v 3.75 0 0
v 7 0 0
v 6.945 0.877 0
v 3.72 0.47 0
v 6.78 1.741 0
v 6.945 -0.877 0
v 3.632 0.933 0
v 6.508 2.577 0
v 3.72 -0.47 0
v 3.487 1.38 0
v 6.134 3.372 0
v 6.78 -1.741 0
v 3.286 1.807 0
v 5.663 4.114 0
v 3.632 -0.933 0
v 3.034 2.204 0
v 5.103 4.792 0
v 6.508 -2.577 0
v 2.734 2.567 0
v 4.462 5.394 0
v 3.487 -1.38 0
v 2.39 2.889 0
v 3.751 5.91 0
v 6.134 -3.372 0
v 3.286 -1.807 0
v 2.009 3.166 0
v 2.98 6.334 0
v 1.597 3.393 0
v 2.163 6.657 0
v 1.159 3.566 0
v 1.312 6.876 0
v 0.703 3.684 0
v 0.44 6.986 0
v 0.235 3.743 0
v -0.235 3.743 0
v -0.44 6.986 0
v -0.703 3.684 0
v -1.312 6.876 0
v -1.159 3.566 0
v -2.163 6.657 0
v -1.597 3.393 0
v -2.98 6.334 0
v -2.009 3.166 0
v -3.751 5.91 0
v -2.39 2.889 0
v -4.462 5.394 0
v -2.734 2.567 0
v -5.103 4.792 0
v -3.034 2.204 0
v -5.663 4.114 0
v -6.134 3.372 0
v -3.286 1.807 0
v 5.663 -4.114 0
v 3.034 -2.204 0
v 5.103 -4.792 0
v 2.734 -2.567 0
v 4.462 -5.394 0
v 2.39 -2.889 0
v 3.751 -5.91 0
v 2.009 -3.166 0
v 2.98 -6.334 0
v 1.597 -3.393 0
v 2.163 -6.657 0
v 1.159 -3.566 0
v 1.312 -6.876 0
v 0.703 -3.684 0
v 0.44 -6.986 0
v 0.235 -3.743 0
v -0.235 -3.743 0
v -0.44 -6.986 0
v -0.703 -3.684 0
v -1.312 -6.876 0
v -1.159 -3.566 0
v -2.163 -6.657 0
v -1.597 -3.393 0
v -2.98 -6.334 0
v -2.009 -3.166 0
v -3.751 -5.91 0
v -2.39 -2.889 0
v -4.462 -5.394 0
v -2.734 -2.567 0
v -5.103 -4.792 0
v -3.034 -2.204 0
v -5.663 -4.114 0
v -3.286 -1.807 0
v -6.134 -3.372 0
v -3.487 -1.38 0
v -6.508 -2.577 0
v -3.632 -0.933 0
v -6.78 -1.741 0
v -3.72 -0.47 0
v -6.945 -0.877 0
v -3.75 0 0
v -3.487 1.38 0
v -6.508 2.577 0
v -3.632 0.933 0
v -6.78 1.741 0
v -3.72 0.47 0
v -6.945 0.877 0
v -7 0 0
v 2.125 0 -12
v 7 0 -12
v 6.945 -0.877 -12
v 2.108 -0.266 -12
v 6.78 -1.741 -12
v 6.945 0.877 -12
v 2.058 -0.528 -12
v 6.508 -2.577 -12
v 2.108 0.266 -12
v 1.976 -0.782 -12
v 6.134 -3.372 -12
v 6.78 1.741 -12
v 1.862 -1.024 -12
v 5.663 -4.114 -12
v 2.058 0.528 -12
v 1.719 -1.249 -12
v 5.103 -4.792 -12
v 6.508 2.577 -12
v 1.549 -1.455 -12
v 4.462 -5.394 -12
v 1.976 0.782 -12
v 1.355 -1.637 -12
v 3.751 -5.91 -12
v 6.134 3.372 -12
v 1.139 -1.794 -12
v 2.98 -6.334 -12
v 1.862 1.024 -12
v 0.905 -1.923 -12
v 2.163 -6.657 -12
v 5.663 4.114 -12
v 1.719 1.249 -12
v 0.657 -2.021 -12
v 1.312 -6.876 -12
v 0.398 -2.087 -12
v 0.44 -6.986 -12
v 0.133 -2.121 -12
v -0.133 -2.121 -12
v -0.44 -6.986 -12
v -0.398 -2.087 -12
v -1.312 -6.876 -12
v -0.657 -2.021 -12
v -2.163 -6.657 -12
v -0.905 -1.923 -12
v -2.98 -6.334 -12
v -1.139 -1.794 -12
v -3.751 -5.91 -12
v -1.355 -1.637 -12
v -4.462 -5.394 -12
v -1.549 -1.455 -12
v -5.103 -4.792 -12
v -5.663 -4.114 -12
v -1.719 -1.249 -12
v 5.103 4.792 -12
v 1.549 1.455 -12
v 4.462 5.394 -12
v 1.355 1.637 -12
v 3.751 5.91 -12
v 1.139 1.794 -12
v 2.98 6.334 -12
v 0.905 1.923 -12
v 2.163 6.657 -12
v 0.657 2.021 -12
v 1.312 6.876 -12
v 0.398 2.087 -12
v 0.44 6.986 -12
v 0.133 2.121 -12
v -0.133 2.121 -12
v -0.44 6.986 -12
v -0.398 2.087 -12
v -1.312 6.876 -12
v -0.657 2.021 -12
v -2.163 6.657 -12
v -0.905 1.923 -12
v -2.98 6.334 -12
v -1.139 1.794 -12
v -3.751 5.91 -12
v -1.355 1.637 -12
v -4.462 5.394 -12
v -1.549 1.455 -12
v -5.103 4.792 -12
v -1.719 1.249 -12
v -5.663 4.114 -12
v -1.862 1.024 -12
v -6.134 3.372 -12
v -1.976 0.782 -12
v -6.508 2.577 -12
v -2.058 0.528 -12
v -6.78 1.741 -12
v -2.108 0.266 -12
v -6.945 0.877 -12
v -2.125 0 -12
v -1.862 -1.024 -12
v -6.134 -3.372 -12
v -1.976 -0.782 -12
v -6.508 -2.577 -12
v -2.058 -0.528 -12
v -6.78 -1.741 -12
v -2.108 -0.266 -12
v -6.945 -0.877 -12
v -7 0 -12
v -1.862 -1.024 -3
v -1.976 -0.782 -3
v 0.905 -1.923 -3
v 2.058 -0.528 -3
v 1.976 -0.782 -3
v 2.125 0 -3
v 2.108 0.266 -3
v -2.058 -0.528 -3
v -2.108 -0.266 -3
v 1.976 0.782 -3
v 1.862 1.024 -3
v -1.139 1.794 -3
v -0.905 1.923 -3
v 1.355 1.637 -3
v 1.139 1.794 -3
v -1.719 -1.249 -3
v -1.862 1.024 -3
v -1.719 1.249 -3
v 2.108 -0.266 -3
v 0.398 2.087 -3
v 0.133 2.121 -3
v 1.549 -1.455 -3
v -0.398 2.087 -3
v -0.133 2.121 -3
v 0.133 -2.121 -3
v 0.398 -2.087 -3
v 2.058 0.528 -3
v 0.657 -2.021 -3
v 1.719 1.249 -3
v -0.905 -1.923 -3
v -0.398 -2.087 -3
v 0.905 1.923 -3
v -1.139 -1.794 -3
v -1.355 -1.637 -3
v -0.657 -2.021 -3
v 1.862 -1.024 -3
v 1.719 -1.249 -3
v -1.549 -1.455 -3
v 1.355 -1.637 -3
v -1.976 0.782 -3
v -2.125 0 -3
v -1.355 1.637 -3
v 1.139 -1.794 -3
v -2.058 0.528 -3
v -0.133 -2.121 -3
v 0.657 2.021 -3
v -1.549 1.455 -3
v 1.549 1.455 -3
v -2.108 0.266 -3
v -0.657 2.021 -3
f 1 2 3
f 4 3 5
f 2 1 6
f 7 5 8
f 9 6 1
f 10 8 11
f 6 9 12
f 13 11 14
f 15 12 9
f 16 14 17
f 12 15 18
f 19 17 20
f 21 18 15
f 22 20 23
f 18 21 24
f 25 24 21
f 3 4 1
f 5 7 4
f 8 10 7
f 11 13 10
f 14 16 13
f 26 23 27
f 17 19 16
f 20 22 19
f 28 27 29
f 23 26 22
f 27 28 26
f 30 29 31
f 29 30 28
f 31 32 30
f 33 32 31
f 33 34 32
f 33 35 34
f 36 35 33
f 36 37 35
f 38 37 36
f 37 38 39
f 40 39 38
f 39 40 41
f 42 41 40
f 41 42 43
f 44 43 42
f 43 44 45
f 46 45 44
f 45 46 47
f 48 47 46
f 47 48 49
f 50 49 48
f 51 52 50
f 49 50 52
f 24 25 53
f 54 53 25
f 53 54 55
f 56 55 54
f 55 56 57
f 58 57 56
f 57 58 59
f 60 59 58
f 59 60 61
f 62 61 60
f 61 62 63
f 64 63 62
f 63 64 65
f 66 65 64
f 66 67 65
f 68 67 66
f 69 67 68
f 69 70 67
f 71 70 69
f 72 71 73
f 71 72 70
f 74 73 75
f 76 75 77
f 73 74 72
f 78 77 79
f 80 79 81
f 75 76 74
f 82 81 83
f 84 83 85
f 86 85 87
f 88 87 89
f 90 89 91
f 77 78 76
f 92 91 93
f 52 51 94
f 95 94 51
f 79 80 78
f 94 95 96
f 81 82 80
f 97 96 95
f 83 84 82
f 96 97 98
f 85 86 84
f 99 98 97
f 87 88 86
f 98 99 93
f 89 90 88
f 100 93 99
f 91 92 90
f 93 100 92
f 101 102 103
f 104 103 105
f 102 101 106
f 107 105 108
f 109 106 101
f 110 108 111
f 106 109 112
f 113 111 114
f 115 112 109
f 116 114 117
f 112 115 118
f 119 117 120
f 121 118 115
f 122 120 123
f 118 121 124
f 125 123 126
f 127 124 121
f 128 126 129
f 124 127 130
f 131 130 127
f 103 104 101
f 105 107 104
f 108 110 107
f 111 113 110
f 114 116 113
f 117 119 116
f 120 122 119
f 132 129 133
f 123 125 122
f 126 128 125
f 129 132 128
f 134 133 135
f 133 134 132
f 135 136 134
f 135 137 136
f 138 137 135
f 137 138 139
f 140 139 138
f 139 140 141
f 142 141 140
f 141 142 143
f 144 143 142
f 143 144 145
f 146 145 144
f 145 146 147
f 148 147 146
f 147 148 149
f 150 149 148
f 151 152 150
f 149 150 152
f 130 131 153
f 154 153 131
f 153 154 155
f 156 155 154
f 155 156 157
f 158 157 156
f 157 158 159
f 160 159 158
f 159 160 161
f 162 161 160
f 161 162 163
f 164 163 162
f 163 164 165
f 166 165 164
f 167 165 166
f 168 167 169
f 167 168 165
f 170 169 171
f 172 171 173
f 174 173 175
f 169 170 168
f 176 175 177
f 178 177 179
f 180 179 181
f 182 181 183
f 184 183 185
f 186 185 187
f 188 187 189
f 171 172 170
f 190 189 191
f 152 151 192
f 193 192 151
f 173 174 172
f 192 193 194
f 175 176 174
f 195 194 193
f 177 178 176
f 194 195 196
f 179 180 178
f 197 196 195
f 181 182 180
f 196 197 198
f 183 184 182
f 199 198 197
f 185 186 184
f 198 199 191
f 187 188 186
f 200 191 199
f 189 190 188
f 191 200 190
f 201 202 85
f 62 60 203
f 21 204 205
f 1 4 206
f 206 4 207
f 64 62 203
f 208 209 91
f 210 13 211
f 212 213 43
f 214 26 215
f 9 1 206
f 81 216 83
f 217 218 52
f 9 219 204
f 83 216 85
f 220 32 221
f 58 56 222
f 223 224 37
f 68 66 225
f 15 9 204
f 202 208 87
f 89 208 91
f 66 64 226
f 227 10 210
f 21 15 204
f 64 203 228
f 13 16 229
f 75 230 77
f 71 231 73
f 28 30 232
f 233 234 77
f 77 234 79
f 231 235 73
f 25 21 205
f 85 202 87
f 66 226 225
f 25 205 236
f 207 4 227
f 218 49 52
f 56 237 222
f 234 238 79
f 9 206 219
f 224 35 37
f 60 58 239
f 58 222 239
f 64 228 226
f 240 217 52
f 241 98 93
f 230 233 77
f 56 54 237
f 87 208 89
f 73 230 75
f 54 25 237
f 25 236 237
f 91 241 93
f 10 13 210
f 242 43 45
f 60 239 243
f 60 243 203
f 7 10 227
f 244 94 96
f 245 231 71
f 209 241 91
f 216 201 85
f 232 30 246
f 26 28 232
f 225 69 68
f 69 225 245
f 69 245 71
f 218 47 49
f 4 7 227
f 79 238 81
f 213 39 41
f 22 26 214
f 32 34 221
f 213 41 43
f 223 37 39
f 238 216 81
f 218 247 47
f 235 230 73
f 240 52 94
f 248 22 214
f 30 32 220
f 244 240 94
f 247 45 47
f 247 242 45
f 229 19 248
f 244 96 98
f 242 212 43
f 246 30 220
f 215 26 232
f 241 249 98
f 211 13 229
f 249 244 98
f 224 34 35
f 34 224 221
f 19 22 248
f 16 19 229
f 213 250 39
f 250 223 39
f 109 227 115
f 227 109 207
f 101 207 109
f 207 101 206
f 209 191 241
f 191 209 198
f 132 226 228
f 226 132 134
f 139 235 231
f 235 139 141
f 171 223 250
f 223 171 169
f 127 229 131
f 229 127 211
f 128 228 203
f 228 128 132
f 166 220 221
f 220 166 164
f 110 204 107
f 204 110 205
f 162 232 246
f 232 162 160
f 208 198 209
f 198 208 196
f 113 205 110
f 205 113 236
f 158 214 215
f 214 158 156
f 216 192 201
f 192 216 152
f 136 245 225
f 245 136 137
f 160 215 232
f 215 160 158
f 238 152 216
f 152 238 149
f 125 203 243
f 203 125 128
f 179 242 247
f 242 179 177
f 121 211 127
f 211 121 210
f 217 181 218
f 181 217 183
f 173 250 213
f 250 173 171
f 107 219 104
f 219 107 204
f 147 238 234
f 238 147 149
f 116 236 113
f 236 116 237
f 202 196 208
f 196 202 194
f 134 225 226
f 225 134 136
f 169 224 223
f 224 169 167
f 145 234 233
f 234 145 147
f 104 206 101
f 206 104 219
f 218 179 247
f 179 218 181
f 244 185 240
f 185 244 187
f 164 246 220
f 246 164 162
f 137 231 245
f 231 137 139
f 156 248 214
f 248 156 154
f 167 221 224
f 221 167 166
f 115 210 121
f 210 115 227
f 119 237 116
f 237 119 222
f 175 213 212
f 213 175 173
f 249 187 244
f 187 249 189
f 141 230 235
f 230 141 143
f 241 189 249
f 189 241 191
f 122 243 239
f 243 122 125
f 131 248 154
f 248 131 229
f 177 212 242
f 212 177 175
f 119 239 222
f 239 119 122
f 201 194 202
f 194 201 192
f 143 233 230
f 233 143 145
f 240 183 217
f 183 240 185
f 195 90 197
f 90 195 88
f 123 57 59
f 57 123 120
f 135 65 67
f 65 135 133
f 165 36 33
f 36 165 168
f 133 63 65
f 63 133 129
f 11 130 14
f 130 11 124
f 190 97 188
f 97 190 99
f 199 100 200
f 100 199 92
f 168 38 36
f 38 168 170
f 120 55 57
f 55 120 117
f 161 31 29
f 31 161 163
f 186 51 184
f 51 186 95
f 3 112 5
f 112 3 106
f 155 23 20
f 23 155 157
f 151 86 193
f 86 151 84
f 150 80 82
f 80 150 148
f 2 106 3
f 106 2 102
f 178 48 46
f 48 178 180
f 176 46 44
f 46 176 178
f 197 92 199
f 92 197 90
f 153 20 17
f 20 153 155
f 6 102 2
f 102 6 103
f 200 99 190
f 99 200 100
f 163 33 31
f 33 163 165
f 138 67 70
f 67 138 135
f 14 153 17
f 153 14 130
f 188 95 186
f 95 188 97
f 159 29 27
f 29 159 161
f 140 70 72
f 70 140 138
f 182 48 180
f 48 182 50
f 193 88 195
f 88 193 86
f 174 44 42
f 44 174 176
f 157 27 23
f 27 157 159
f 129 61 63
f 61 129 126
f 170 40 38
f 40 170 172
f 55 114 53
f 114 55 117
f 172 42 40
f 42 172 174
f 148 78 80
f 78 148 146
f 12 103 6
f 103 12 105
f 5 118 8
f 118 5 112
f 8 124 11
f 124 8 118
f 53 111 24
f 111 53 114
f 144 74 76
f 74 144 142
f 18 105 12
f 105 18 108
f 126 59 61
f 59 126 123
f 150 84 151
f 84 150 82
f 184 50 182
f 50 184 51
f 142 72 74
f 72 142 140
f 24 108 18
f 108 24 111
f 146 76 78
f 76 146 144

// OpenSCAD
$fn = 50;


difference() {
	union() {
		translate(v = [0, 0, -12.0000000000]) {
			cylinder(h = 12, r = 7.0000000000);
		}
	}
	union() {
		translate(v = [0, 0, 0]) {
			rotate(a = [0, 0, 0]) {
				difference() {
					union() {
						#translate(v = [0, 0, -12.0000000000]) {
							cylinder(h = 12, r = 2.0000000000);
						}
						#translate(v = [0, 0, -3]) {
							cylinder(h = 3, r1 = 2.1250000000, r2 = 3.7500000000);
						}
						#translate(v = [0, 0, -12.0000000000]) {
							cylinder(h = 12, r = 2.1250000000);
						}
						#translate(v = [0, 0, -12.0000000000]) {
							cylinder(h = 12, r = 2.0000000000);
						}
					}
					union();
				}
			}
		}
	}
}
